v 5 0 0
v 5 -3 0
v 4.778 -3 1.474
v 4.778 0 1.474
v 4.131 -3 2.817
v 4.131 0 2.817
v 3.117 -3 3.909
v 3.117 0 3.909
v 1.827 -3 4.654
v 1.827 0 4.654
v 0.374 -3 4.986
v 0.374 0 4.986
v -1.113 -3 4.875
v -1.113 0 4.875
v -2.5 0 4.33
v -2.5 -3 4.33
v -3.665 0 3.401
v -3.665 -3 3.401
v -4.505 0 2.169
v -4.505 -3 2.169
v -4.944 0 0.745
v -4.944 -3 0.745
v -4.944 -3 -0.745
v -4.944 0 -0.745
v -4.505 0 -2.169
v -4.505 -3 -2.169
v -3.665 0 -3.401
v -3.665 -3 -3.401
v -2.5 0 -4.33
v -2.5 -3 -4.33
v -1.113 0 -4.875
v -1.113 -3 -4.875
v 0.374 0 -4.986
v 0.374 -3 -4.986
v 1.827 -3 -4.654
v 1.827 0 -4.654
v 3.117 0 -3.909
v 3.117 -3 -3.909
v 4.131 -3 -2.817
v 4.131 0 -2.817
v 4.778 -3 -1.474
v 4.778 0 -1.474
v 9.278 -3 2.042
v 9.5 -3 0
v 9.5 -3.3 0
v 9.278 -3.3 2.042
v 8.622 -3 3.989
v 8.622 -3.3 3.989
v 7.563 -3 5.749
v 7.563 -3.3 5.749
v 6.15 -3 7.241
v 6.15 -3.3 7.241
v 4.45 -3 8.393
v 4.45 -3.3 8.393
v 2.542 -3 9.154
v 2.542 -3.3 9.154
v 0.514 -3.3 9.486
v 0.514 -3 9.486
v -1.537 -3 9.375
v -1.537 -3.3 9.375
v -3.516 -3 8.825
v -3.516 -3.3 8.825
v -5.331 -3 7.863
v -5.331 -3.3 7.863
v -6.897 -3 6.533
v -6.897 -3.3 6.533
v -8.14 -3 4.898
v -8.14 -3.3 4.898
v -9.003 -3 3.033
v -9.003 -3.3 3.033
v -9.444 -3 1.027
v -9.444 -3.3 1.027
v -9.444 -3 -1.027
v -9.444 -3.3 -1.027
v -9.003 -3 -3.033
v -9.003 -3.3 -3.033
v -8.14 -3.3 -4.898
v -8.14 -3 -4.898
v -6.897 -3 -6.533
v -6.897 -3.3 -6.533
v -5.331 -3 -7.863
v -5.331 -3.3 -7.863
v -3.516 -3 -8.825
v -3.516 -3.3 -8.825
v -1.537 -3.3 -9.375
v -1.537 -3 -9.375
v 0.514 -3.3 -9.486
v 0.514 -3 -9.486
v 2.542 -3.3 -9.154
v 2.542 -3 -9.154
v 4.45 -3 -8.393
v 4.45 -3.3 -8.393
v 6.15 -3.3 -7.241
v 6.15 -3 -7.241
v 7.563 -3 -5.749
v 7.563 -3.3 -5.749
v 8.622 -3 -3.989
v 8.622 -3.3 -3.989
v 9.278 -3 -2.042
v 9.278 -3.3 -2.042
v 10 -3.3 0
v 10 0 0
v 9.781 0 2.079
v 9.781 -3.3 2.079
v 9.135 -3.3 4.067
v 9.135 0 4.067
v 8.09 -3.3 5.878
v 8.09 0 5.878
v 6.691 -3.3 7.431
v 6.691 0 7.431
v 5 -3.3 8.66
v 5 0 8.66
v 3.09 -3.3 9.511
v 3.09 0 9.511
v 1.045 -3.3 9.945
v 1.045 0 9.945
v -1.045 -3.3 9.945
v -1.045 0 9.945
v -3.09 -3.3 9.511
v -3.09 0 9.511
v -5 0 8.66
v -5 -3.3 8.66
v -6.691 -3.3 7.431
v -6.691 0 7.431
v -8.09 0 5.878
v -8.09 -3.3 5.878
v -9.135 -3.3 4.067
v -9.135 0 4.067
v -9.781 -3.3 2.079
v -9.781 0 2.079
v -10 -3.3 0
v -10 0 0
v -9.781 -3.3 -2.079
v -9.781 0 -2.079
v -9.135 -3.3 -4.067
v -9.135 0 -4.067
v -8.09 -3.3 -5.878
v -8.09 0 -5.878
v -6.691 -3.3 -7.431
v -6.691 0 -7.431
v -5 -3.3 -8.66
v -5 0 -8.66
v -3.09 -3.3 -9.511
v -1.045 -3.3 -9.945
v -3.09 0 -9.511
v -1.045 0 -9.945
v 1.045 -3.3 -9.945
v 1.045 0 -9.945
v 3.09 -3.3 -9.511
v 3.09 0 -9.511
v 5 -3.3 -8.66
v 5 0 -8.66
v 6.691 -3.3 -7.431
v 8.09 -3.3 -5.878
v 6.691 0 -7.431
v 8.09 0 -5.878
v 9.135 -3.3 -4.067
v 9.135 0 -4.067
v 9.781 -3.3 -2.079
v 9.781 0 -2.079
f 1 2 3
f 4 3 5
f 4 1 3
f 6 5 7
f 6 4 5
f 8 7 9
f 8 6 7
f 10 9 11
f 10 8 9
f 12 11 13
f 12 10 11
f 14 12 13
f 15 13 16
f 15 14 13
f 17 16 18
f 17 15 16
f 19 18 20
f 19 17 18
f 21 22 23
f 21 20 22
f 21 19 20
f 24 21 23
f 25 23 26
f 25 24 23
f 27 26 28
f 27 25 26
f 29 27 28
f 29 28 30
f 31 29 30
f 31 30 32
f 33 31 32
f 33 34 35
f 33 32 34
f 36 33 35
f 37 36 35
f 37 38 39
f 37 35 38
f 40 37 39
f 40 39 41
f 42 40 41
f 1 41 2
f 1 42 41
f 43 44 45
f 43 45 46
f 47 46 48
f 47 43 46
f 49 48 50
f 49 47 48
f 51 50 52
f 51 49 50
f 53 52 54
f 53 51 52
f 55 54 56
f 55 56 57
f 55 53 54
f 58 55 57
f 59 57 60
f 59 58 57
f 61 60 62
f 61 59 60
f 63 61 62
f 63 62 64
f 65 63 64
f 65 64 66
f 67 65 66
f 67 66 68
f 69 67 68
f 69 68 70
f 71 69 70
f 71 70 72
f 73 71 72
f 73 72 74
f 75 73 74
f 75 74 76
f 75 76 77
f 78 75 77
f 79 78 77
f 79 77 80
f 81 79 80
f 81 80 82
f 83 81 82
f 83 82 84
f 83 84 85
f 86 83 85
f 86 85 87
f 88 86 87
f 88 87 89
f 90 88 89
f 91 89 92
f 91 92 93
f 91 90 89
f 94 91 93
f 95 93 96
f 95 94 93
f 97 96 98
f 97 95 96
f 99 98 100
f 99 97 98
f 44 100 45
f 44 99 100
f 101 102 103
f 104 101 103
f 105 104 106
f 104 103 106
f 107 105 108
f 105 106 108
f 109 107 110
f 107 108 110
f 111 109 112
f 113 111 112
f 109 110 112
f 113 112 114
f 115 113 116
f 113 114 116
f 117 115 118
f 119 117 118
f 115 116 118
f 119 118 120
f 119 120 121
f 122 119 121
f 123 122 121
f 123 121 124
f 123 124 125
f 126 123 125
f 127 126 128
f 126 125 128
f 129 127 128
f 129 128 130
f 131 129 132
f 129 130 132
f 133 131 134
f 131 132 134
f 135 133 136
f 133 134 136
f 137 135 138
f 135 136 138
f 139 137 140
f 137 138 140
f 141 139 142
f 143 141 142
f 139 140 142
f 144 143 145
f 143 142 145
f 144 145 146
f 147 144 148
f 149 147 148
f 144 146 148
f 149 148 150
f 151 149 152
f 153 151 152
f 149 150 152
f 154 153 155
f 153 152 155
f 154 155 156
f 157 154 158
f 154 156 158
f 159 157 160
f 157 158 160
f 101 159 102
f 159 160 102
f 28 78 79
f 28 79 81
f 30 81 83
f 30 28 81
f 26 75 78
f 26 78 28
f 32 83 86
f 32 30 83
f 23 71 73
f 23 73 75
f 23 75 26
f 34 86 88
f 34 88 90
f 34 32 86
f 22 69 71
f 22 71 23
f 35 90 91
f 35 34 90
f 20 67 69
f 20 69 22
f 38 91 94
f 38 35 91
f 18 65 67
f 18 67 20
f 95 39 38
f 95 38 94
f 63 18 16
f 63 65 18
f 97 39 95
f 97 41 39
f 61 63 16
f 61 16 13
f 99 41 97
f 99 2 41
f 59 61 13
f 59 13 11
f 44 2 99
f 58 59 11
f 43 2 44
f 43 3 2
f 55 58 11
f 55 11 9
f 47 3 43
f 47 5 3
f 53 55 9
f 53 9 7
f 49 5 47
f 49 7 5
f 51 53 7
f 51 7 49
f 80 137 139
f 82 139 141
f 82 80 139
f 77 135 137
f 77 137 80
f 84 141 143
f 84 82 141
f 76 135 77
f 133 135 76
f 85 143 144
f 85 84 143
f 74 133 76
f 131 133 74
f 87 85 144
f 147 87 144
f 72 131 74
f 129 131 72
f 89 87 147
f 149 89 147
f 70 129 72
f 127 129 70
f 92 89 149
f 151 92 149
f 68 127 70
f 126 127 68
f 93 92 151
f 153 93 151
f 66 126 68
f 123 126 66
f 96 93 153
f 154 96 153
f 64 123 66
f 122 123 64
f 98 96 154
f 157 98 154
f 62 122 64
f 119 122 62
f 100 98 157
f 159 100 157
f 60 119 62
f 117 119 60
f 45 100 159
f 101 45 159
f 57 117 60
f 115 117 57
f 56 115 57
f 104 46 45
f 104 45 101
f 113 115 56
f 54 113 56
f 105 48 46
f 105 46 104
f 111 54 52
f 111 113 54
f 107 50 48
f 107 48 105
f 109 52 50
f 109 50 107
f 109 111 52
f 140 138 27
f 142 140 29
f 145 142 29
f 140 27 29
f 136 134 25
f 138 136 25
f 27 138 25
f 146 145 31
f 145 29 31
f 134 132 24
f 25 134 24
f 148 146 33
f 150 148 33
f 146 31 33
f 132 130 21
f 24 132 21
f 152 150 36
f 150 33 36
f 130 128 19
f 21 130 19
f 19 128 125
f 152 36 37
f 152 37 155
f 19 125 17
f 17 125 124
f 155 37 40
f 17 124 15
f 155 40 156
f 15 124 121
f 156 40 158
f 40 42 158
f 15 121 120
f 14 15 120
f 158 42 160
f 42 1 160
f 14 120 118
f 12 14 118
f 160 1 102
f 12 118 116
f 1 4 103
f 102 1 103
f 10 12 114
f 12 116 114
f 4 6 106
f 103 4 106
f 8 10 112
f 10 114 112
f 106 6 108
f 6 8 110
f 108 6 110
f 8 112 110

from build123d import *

# Parameters (mm, degrees)
F0_R     = 10
F0_R_2   = 9.5
F1_DEPTH = 3.3
F0_R_3   = 5
F2_DEPTH = 3
F3_DEPTH = 25


with BuildPart() as f1:
    # F0 (on Front) → F1 (new body)
    with BuildSketch(Plane.XZ):
        Circle(F0_R)
        Circle(F0_R_2, mode=Mode.SUBTRACT)
    extrude(amount=F1_DEPTH)

    # F0 (on Front) → F2 (join)
    with BuildSketch(Plane.XZ):
        Circle(F0_R_2)
        Circle(F0_R_3, mode=Mode.SUBTRACT)
        Circle(F0_R_3)
    extrude(amount=F2_DEPTH)

    # F0 (on Front) → F3 (cut)
    with BuildSketch(Plane.XZ):
        Circle(F0_R_3)
    extrude(amount=F3_DEPTH, mode=Mode.SUBTRACT)


solid = f1.part
